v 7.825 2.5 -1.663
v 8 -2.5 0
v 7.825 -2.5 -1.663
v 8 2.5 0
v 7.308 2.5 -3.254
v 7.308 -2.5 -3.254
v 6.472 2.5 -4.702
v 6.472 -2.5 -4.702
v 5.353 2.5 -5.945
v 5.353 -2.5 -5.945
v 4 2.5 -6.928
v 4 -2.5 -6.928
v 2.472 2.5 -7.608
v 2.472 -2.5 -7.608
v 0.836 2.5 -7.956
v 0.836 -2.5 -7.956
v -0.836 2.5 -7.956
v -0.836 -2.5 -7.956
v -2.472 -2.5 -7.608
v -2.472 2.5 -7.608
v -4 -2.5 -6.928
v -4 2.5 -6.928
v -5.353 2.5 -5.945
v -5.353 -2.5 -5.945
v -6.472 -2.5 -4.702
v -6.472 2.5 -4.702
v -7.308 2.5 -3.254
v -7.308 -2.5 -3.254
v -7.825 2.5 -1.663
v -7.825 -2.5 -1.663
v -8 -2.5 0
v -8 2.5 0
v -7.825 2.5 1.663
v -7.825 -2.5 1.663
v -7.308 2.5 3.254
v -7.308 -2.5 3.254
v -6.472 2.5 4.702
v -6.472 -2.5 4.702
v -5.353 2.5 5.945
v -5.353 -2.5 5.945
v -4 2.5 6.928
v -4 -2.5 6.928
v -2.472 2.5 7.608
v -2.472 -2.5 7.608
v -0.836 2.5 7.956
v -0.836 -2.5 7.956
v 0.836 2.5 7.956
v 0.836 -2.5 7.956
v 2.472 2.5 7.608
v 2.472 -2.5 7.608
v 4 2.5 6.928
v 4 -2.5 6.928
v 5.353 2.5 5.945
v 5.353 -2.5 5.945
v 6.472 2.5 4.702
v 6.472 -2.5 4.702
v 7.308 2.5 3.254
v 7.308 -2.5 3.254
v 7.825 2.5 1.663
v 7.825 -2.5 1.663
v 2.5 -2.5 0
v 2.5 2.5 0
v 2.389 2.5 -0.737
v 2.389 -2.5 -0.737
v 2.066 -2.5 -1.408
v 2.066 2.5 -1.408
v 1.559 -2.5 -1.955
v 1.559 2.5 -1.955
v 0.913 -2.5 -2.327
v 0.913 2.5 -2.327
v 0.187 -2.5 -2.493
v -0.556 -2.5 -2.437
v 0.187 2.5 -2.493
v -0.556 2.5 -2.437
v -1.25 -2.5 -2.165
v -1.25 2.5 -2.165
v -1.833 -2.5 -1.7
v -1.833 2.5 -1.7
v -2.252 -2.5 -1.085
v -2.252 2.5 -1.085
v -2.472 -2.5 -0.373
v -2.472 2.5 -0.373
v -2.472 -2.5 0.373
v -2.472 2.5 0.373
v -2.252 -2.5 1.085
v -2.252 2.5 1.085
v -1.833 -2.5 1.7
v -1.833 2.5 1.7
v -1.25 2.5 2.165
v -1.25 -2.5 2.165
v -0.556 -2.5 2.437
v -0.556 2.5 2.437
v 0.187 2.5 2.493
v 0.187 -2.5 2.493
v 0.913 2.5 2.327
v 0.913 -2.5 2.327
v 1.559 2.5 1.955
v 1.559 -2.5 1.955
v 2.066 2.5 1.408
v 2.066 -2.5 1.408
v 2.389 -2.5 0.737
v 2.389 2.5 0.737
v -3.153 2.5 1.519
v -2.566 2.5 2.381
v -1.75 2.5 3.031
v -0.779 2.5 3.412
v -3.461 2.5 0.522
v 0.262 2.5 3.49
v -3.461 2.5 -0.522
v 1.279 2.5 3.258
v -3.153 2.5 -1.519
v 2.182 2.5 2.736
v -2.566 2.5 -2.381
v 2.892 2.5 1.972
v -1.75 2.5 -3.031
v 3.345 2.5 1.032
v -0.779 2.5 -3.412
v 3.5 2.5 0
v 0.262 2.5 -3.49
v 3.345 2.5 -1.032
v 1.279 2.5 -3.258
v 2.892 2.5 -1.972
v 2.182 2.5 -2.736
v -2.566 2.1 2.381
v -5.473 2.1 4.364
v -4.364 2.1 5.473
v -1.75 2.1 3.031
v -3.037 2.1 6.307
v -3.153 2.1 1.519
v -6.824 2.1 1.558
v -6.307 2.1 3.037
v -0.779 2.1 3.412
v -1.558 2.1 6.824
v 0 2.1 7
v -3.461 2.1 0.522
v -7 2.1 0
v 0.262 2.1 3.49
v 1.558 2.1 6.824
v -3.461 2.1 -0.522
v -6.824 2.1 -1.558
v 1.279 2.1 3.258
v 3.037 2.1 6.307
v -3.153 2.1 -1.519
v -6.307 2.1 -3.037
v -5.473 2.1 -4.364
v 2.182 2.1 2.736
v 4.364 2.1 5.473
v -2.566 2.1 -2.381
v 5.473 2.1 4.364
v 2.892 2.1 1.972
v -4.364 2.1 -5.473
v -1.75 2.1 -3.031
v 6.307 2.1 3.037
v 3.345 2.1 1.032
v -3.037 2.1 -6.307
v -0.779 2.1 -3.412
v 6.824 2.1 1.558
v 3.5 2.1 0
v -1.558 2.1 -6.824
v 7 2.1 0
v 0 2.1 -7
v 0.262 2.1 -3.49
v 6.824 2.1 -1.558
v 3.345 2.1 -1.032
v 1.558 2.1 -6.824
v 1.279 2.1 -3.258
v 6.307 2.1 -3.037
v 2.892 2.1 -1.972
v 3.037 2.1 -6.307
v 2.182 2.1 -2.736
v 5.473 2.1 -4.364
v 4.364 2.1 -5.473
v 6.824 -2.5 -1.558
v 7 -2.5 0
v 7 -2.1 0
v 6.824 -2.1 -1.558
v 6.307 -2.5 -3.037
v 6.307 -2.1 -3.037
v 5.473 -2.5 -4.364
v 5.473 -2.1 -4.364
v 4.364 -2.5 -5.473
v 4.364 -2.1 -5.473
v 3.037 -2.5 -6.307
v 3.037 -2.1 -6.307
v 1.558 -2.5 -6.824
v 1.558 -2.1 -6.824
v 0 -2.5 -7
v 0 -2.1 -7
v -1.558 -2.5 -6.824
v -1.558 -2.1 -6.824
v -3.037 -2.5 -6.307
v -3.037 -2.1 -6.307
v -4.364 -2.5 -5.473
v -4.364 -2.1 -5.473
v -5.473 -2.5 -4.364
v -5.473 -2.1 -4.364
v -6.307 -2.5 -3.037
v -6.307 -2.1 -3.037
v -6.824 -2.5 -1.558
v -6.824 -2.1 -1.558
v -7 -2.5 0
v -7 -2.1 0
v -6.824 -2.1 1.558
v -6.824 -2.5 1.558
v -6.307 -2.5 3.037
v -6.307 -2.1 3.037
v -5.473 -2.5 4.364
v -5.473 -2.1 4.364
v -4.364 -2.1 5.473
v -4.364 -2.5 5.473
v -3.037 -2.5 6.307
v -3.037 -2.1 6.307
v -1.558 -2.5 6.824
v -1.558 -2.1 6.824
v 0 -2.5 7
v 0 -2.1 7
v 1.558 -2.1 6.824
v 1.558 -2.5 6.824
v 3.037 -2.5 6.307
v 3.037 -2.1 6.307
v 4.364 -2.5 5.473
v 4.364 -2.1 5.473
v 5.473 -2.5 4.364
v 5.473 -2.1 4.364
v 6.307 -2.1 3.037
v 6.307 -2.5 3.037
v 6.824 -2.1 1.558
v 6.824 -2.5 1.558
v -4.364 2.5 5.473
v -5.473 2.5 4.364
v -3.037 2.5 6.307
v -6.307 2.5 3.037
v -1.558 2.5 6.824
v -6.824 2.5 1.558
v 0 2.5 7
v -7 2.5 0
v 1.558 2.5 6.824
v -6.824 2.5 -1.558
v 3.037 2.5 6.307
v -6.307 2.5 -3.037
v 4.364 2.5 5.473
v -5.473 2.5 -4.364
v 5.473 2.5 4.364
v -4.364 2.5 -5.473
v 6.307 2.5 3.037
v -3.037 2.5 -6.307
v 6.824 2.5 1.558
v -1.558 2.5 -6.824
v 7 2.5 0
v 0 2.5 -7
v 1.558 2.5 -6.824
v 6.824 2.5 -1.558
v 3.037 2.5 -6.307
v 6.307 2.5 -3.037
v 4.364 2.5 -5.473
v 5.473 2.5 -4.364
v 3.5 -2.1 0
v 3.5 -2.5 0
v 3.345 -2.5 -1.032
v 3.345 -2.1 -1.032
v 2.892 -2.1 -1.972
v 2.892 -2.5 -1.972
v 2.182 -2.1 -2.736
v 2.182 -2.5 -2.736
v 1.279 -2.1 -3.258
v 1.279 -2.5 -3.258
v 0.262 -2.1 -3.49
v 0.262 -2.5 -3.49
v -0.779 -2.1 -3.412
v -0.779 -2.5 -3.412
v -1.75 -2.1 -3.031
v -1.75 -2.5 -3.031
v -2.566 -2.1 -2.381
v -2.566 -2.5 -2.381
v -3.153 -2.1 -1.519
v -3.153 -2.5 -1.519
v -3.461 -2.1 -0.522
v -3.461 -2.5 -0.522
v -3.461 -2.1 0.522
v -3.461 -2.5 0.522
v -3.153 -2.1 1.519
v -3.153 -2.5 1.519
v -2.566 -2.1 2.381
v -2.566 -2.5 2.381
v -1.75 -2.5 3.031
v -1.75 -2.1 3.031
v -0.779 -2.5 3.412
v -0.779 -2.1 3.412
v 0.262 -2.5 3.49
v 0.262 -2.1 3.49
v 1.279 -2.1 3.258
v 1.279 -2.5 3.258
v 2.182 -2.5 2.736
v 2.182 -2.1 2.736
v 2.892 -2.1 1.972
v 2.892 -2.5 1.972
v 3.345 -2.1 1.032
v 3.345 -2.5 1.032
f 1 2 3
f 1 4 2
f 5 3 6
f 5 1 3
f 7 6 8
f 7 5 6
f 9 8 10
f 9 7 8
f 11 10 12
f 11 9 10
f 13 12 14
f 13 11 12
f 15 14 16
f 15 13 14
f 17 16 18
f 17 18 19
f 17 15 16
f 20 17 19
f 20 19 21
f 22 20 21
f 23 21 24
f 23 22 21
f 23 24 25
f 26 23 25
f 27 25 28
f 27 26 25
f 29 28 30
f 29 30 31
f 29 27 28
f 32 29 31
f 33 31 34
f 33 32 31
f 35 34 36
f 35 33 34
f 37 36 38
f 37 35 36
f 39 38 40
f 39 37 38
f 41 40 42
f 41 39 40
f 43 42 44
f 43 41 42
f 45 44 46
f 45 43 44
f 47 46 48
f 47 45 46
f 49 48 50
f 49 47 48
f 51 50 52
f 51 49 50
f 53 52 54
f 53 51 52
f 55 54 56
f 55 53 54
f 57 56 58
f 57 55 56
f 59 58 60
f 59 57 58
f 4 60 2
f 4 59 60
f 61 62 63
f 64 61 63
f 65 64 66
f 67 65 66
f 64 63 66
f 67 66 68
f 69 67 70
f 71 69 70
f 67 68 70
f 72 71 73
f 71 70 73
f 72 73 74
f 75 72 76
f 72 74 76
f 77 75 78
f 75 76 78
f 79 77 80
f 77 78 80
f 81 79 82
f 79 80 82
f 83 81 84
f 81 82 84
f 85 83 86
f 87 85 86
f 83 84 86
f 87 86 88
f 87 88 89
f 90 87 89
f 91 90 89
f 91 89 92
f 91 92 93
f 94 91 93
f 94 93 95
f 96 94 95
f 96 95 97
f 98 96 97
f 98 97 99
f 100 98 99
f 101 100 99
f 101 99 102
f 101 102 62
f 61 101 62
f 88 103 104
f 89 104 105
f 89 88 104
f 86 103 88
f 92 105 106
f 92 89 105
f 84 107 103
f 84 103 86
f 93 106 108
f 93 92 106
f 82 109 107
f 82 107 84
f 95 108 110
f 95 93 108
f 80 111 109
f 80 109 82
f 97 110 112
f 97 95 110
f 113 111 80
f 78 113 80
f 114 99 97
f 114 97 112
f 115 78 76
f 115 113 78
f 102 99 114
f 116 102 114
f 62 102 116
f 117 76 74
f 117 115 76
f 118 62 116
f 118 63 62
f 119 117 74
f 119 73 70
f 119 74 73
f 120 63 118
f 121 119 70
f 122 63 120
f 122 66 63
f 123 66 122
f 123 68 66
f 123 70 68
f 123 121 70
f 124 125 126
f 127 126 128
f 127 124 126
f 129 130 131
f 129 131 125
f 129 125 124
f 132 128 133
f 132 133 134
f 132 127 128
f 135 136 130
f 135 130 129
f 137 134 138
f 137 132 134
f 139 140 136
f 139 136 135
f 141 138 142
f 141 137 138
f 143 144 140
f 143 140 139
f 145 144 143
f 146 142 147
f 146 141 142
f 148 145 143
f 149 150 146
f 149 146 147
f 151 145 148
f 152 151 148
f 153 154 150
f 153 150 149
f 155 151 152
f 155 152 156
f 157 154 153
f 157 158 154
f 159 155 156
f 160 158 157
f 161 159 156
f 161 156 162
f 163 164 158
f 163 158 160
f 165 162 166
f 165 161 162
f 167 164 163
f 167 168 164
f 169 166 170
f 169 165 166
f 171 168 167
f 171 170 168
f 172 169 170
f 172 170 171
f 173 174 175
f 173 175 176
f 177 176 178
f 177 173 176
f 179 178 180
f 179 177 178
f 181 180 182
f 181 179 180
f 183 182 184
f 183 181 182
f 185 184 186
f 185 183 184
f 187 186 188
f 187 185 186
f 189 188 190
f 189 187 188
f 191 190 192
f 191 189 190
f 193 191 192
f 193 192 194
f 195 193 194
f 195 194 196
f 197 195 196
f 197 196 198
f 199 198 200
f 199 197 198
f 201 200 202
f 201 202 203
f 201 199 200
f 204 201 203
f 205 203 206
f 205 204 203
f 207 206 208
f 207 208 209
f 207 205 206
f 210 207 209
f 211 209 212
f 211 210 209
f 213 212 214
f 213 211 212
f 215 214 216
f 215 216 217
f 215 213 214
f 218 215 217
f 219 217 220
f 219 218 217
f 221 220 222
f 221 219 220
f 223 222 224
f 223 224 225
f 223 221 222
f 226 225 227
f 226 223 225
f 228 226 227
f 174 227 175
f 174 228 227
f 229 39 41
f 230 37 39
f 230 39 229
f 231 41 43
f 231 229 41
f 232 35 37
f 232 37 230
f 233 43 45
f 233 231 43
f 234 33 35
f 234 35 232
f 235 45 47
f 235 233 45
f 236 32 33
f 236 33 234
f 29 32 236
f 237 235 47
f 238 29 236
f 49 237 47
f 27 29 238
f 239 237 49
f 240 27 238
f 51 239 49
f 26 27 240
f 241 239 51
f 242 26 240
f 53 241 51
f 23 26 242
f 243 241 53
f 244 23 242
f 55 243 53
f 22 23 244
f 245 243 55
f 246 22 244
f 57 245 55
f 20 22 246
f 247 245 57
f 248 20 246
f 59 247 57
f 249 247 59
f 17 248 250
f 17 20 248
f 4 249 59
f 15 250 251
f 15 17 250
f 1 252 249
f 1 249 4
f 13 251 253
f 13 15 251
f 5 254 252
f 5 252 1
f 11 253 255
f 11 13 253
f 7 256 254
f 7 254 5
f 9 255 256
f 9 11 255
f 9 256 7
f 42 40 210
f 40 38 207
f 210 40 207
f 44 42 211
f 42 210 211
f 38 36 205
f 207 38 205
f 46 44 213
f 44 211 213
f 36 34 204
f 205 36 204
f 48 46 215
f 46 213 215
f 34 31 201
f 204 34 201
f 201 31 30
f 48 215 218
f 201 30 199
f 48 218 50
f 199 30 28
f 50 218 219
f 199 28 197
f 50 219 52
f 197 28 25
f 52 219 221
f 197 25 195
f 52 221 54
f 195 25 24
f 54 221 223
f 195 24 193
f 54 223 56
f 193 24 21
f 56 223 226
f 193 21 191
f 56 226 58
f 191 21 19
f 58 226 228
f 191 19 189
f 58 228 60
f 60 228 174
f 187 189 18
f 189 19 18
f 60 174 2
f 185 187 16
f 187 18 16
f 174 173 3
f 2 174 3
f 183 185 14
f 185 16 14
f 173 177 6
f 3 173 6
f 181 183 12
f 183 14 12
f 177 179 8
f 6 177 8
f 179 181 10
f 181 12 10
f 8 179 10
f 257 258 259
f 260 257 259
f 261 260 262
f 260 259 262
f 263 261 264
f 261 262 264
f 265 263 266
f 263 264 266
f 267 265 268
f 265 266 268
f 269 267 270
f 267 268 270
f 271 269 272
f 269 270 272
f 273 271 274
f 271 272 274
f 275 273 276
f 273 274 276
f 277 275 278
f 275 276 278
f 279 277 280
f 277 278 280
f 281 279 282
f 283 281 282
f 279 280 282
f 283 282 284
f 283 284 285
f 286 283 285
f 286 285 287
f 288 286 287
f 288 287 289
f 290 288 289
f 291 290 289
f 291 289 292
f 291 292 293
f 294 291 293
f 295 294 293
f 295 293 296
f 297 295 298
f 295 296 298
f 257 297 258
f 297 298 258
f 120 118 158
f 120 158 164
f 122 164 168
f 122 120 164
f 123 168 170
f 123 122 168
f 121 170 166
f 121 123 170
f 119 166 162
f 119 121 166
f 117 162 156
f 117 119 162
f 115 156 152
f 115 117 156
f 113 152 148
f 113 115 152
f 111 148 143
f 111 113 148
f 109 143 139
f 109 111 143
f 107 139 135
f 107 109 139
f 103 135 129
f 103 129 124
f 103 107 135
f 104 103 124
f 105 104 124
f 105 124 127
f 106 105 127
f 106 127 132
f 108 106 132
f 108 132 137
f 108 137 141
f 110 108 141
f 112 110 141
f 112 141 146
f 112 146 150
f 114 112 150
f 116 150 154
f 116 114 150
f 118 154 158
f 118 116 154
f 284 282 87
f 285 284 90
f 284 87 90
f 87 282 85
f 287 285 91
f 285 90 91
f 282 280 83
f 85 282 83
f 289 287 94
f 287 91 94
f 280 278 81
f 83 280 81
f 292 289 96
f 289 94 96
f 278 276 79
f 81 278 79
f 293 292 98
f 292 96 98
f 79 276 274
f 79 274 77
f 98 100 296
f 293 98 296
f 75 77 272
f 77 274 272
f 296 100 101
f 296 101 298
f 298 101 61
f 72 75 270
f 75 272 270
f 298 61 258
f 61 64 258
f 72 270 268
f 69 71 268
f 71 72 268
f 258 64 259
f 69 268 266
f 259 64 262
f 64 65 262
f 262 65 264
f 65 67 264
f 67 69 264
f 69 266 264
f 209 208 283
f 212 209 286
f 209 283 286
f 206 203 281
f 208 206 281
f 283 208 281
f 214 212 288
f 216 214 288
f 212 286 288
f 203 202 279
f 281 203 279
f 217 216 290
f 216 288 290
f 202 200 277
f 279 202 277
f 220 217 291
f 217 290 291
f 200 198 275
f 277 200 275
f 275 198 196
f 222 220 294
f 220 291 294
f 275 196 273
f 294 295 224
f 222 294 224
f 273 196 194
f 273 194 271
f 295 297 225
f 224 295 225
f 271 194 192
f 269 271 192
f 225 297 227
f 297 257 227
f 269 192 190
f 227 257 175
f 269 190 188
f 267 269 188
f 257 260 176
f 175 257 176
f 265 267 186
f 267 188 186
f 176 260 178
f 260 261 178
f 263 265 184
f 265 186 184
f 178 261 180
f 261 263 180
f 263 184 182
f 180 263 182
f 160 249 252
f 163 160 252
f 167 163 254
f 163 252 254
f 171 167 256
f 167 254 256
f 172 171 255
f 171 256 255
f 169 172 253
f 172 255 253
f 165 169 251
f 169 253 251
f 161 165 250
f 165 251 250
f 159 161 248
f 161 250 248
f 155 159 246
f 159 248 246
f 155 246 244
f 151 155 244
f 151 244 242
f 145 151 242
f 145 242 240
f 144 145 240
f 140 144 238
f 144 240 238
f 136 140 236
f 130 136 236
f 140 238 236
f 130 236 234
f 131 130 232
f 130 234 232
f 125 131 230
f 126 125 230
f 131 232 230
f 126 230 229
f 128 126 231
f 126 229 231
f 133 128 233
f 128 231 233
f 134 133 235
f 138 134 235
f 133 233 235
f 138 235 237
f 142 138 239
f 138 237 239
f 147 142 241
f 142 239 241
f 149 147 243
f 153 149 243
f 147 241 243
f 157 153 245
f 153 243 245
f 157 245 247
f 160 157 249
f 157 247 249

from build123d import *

# Parameters (mm, degrees)
BOSS_EXTRUDE1_DEPTH      = 2.5
BOSS_EXTRUDE1_DEPTH_BACK = 2.5
SKETCH1_R                = 8
SKETCH2_R                = 2.5
CUT_EXTRUDE1_DEPTH       = 13.369316877
SKETCH3_R                = 7
SKETCH3_R_2              = 3.5
CUT_EXTRUDE2_DEPTH       = 0.4


with BuildPart() as part:
    # Sketch1 → Boss-Extrude1 (new, two sides: drawn at the far end of the back side and taken through both)
    with BuildSketch(Plane(origin=(0, 0, 0), x_dir=(1, 0, 0), z_dir=(0, 1, 0)).offset(-BOSS_EXTRUDE1_DEPTH_BACK)):
        Circle(SKETCH1_R)
    extrude(amount=BOSS_EXTRUDE1_DEPTH + BOSS_EXTRUDE1_DEPTH_BACK)

    # Sketch2 → Cut-Extrude1 (cut, through all)
    with BuildSketch(Plane(origin=(0, 2.5, 0), x_dir=(1, 0, 0), z_dir=(0, 1, 0))):
        Circle(SKETCH2_R)
    extrude(amount=-CUT_EXTRUDE1_DEPTH, mode=Mode.SUBTRACT)

    # Sketch3 → Cut-Extrude2 (cut)
    with BuildSketch(Plane(origin=(0, 2.5, 0), x_dir=(1, 0, 0), z_dir=(0, 1, 0))):
        Circle(SKETCH3_R)
        Circle(SKETCH3_R_2, mode=Mode.SUBTRACT)
    cut_extrude2 = extrude(amount=-CUT_EXTRUDE2_DEPTH, mode=Mode.SUBTRACT)

    # Mirror1: Cut-Extrude2 across plane
    add(cut_extrude2.mirror(Plane.ZX), mode=Mode.SUBTRACT)


solid = part.part
